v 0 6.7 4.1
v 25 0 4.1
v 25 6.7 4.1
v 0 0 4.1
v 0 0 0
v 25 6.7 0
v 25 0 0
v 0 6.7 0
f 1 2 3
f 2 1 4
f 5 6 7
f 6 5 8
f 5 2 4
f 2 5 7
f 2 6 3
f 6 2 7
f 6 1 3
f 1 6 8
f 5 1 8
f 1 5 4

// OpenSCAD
//kinectV2LaylaBracket.scad
//10-27-18

//25cm long, 4.1cm high, 6.7cm deep 
kinectWidth = 25;  
kinectHeight = 4.1; 
kinectDepth = 6.7; 
cube([kinectWidth, kinectDepth, kinectHeight]); //width, height, depth ? But wid,hei looks swapped
